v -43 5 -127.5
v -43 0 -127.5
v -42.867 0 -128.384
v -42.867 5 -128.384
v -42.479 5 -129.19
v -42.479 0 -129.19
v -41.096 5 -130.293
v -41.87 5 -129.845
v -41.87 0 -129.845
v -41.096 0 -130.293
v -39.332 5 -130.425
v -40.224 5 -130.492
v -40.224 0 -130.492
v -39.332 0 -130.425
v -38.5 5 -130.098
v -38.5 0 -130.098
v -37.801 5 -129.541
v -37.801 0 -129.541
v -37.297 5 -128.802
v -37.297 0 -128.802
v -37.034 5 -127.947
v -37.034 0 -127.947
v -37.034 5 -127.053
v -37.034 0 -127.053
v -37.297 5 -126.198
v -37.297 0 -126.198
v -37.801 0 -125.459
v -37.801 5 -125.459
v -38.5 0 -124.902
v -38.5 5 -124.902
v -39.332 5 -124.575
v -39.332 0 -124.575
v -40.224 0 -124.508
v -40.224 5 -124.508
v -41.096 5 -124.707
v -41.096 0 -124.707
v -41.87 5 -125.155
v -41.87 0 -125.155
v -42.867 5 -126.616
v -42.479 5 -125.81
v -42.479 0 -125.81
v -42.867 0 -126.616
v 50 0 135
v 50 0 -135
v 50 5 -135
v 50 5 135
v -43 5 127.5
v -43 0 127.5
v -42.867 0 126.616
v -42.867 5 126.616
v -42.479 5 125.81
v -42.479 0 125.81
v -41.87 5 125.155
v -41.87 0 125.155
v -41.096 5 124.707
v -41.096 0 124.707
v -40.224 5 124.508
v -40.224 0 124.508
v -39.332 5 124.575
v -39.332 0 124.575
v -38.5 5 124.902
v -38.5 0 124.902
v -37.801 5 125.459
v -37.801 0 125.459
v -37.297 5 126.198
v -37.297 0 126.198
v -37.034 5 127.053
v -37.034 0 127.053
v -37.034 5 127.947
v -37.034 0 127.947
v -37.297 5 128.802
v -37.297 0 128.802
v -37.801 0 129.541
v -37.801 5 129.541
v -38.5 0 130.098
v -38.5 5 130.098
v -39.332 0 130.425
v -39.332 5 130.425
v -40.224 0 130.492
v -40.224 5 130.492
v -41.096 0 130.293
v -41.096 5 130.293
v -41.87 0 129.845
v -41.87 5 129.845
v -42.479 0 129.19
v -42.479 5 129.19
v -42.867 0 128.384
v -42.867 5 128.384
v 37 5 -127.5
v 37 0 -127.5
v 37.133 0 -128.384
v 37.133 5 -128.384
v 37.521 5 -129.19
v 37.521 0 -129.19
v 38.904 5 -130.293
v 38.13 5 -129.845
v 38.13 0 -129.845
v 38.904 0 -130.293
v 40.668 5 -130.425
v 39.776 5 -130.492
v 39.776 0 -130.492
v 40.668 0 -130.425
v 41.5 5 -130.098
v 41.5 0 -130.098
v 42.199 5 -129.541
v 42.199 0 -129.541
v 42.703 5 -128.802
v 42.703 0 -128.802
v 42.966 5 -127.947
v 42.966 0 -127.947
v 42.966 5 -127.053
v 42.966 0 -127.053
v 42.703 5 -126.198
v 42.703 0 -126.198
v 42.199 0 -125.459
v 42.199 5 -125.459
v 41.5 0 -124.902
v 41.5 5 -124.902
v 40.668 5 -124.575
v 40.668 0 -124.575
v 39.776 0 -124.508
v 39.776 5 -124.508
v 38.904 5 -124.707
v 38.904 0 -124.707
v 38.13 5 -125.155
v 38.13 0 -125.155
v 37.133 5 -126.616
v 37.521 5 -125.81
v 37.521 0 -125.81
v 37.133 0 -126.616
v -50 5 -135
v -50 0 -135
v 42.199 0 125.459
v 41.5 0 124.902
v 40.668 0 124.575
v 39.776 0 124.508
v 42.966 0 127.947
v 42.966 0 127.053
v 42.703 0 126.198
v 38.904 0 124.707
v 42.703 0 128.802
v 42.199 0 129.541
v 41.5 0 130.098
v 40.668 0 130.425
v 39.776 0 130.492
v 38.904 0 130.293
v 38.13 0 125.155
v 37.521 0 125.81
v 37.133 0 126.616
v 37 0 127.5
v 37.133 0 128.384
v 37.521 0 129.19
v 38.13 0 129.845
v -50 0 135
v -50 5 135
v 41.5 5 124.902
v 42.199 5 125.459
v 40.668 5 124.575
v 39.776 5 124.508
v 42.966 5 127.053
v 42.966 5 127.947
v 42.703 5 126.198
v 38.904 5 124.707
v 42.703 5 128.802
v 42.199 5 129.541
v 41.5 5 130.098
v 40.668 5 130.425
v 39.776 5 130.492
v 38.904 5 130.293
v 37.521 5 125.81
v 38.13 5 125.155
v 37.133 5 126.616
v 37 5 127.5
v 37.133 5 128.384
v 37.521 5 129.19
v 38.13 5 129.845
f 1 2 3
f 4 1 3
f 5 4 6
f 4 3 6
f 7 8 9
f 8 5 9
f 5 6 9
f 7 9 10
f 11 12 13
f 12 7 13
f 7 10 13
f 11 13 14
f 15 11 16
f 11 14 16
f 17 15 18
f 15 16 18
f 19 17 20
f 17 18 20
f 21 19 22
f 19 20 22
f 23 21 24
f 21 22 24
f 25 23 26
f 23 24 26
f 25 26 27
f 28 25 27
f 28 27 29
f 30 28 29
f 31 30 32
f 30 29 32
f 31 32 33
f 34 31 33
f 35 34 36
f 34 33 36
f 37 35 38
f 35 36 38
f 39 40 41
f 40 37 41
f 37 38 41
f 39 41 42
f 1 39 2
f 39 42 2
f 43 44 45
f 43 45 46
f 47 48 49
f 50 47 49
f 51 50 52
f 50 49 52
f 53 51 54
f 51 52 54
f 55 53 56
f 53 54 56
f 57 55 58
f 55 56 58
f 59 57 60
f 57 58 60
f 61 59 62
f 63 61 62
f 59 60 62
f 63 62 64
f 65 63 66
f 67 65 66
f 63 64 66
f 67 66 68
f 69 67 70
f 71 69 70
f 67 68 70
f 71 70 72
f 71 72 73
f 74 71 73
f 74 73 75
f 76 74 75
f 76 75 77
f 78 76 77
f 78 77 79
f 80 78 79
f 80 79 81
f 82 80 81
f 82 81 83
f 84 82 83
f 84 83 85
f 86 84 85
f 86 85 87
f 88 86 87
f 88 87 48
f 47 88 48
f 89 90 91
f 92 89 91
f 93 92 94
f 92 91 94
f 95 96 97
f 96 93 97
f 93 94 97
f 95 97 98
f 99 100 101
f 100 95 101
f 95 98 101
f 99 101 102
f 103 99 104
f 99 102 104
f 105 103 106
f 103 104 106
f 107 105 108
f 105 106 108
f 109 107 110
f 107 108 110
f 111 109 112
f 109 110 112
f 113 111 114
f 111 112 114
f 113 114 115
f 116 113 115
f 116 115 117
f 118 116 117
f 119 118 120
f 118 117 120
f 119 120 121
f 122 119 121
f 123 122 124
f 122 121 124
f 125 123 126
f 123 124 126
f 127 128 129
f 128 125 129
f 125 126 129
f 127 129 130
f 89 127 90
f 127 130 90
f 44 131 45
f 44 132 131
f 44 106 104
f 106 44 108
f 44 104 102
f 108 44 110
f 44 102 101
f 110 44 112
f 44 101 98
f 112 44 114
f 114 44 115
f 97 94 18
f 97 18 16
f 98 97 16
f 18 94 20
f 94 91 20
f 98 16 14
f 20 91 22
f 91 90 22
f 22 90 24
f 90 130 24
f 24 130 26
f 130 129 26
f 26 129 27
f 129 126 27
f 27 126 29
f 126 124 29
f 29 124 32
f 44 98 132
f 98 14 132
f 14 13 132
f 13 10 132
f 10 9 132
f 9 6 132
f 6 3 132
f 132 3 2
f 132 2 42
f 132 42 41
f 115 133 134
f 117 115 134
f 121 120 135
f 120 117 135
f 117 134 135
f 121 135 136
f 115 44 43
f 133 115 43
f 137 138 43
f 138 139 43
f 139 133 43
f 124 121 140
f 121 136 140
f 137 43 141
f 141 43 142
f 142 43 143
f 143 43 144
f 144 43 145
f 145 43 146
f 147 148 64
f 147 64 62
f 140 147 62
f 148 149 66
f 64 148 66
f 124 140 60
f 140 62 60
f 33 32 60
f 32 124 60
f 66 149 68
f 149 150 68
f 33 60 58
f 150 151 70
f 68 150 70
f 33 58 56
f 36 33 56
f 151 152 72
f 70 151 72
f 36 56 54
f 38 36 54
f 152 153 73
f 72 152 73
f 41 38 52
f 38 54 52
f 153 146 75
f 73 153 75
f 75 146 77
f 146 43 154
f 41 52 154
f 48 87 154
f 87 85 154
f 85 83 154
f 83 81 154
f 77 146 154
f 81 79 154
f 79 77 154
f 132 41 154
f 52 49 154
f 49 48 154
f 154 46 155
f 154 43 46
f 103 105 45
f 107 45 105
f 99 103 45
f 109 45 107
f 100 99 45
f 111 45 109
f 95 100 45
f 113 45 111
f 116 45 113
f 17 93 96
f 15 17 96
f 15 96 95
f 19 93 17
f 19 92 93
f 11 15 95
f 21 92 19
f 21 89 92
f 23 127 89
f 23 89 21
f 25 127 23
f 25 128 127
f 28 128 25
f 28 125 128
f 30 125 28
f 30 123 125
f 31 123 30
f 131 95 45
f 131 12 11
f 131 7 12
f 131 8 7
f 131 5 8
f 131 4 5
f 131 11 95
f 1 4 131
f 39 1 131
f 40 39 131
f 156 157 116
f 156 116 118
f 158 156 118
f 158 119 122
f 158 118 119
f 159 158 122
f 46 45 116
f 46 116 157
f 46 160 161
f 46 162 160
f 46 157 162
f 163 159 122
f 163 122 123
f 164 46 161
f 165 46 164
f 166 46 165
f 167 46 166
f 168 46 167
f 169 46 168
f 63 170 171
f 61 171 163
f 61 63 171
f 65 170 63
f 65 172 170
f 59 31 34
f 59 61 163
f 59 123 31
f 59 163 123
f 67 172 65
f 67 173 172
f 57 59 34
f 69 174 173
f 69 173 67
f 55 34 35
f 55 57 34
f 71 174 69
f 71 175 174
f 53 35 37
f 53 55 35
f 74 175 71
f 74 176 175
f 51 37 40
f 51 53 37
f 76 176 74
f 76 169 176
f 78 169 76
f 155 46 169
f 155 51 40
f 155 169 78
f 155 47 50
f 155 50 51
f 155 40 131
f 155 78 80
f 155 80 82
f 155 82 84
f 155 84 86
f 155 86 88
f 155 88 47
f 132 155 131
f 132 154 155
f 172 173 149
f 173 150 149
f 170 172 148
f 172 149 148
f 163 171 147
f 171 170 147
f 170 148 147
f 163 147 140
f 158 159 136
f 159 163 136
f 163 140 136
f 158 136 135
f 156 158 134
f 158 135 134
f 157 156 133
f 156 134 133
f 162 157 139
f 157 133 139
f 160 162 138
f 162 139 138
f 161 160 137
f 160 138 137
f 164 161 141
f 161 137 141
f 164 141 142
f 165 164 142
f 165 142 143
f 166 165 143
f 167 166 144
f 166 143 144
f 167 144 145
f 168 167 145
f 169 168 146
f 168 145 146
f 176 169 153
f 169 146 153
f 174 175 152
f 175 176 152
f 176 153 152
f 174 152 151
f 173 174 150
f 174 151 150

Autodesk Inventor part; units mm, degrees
ref_plane "YZ Plane" through (0, 0, 0) normal (1, 0, 0) x (0, 1, 0)
ref_plane "XZ Plane" through (0, 0, 0) normal (0, 1, 0) x (-1, 0, 0)
ref_plane "XY Plane" through (0, 0, 0) normal (0, 0, 1) x (1, 0, 0)
sketch "Sketch1" plane through (0, 0, 0) normal (0, 1, 0) x (-1, 0, 0)
  line L0 (0, 0) -> (0, 135)
  line L1 (0, 135) -> (0, -135)
  line L2 (0, -135) -> (50, -135)
  line L3 (50, -135) -> (-50, -135)
  line L4 (-50, -135) -> (-50, 135)
  line L5 (-50, 135) -> (50, 135)
  line L6 (50, 135) -> (50, -135)
  line L7 (50, 135) -> (50, 127.5)
  line L8 (50, 127.5) -> (40, 127.5)
  circle A0 centre (40, 127.5) radius 3
  line L9 (40, 127.5) -> (-40, 127.5)
  circle A1 centre (-40, 127.5) radius 3
  line L10 (50, 0) -> (-50, 0)
  circle A2 centre (40, -127.5) radius 3
  circle A3 centre (-40, -127.5) radius 3
  dimension "d0" = 135
  dimension "d1" = 270
  dimension "d2" = 50
  dimension "d3" = 100
  dimension "d4" = 7.5
  dimension "d5" = 10
  dimension "d6" = 6
  dimension "d7" = 80
  dimension "d8" = 6
extrude "Extrusion1" add sketch "Sketch1" along normal blind 5 contours L10 L4 L5 L0 | L10 L6 L2 L1 | L0 L9 A0 L8 L6 L10 | L1 L3 L4 L10 | L0 L5 L6 L8 A0 L9
properties part number "side_front"
